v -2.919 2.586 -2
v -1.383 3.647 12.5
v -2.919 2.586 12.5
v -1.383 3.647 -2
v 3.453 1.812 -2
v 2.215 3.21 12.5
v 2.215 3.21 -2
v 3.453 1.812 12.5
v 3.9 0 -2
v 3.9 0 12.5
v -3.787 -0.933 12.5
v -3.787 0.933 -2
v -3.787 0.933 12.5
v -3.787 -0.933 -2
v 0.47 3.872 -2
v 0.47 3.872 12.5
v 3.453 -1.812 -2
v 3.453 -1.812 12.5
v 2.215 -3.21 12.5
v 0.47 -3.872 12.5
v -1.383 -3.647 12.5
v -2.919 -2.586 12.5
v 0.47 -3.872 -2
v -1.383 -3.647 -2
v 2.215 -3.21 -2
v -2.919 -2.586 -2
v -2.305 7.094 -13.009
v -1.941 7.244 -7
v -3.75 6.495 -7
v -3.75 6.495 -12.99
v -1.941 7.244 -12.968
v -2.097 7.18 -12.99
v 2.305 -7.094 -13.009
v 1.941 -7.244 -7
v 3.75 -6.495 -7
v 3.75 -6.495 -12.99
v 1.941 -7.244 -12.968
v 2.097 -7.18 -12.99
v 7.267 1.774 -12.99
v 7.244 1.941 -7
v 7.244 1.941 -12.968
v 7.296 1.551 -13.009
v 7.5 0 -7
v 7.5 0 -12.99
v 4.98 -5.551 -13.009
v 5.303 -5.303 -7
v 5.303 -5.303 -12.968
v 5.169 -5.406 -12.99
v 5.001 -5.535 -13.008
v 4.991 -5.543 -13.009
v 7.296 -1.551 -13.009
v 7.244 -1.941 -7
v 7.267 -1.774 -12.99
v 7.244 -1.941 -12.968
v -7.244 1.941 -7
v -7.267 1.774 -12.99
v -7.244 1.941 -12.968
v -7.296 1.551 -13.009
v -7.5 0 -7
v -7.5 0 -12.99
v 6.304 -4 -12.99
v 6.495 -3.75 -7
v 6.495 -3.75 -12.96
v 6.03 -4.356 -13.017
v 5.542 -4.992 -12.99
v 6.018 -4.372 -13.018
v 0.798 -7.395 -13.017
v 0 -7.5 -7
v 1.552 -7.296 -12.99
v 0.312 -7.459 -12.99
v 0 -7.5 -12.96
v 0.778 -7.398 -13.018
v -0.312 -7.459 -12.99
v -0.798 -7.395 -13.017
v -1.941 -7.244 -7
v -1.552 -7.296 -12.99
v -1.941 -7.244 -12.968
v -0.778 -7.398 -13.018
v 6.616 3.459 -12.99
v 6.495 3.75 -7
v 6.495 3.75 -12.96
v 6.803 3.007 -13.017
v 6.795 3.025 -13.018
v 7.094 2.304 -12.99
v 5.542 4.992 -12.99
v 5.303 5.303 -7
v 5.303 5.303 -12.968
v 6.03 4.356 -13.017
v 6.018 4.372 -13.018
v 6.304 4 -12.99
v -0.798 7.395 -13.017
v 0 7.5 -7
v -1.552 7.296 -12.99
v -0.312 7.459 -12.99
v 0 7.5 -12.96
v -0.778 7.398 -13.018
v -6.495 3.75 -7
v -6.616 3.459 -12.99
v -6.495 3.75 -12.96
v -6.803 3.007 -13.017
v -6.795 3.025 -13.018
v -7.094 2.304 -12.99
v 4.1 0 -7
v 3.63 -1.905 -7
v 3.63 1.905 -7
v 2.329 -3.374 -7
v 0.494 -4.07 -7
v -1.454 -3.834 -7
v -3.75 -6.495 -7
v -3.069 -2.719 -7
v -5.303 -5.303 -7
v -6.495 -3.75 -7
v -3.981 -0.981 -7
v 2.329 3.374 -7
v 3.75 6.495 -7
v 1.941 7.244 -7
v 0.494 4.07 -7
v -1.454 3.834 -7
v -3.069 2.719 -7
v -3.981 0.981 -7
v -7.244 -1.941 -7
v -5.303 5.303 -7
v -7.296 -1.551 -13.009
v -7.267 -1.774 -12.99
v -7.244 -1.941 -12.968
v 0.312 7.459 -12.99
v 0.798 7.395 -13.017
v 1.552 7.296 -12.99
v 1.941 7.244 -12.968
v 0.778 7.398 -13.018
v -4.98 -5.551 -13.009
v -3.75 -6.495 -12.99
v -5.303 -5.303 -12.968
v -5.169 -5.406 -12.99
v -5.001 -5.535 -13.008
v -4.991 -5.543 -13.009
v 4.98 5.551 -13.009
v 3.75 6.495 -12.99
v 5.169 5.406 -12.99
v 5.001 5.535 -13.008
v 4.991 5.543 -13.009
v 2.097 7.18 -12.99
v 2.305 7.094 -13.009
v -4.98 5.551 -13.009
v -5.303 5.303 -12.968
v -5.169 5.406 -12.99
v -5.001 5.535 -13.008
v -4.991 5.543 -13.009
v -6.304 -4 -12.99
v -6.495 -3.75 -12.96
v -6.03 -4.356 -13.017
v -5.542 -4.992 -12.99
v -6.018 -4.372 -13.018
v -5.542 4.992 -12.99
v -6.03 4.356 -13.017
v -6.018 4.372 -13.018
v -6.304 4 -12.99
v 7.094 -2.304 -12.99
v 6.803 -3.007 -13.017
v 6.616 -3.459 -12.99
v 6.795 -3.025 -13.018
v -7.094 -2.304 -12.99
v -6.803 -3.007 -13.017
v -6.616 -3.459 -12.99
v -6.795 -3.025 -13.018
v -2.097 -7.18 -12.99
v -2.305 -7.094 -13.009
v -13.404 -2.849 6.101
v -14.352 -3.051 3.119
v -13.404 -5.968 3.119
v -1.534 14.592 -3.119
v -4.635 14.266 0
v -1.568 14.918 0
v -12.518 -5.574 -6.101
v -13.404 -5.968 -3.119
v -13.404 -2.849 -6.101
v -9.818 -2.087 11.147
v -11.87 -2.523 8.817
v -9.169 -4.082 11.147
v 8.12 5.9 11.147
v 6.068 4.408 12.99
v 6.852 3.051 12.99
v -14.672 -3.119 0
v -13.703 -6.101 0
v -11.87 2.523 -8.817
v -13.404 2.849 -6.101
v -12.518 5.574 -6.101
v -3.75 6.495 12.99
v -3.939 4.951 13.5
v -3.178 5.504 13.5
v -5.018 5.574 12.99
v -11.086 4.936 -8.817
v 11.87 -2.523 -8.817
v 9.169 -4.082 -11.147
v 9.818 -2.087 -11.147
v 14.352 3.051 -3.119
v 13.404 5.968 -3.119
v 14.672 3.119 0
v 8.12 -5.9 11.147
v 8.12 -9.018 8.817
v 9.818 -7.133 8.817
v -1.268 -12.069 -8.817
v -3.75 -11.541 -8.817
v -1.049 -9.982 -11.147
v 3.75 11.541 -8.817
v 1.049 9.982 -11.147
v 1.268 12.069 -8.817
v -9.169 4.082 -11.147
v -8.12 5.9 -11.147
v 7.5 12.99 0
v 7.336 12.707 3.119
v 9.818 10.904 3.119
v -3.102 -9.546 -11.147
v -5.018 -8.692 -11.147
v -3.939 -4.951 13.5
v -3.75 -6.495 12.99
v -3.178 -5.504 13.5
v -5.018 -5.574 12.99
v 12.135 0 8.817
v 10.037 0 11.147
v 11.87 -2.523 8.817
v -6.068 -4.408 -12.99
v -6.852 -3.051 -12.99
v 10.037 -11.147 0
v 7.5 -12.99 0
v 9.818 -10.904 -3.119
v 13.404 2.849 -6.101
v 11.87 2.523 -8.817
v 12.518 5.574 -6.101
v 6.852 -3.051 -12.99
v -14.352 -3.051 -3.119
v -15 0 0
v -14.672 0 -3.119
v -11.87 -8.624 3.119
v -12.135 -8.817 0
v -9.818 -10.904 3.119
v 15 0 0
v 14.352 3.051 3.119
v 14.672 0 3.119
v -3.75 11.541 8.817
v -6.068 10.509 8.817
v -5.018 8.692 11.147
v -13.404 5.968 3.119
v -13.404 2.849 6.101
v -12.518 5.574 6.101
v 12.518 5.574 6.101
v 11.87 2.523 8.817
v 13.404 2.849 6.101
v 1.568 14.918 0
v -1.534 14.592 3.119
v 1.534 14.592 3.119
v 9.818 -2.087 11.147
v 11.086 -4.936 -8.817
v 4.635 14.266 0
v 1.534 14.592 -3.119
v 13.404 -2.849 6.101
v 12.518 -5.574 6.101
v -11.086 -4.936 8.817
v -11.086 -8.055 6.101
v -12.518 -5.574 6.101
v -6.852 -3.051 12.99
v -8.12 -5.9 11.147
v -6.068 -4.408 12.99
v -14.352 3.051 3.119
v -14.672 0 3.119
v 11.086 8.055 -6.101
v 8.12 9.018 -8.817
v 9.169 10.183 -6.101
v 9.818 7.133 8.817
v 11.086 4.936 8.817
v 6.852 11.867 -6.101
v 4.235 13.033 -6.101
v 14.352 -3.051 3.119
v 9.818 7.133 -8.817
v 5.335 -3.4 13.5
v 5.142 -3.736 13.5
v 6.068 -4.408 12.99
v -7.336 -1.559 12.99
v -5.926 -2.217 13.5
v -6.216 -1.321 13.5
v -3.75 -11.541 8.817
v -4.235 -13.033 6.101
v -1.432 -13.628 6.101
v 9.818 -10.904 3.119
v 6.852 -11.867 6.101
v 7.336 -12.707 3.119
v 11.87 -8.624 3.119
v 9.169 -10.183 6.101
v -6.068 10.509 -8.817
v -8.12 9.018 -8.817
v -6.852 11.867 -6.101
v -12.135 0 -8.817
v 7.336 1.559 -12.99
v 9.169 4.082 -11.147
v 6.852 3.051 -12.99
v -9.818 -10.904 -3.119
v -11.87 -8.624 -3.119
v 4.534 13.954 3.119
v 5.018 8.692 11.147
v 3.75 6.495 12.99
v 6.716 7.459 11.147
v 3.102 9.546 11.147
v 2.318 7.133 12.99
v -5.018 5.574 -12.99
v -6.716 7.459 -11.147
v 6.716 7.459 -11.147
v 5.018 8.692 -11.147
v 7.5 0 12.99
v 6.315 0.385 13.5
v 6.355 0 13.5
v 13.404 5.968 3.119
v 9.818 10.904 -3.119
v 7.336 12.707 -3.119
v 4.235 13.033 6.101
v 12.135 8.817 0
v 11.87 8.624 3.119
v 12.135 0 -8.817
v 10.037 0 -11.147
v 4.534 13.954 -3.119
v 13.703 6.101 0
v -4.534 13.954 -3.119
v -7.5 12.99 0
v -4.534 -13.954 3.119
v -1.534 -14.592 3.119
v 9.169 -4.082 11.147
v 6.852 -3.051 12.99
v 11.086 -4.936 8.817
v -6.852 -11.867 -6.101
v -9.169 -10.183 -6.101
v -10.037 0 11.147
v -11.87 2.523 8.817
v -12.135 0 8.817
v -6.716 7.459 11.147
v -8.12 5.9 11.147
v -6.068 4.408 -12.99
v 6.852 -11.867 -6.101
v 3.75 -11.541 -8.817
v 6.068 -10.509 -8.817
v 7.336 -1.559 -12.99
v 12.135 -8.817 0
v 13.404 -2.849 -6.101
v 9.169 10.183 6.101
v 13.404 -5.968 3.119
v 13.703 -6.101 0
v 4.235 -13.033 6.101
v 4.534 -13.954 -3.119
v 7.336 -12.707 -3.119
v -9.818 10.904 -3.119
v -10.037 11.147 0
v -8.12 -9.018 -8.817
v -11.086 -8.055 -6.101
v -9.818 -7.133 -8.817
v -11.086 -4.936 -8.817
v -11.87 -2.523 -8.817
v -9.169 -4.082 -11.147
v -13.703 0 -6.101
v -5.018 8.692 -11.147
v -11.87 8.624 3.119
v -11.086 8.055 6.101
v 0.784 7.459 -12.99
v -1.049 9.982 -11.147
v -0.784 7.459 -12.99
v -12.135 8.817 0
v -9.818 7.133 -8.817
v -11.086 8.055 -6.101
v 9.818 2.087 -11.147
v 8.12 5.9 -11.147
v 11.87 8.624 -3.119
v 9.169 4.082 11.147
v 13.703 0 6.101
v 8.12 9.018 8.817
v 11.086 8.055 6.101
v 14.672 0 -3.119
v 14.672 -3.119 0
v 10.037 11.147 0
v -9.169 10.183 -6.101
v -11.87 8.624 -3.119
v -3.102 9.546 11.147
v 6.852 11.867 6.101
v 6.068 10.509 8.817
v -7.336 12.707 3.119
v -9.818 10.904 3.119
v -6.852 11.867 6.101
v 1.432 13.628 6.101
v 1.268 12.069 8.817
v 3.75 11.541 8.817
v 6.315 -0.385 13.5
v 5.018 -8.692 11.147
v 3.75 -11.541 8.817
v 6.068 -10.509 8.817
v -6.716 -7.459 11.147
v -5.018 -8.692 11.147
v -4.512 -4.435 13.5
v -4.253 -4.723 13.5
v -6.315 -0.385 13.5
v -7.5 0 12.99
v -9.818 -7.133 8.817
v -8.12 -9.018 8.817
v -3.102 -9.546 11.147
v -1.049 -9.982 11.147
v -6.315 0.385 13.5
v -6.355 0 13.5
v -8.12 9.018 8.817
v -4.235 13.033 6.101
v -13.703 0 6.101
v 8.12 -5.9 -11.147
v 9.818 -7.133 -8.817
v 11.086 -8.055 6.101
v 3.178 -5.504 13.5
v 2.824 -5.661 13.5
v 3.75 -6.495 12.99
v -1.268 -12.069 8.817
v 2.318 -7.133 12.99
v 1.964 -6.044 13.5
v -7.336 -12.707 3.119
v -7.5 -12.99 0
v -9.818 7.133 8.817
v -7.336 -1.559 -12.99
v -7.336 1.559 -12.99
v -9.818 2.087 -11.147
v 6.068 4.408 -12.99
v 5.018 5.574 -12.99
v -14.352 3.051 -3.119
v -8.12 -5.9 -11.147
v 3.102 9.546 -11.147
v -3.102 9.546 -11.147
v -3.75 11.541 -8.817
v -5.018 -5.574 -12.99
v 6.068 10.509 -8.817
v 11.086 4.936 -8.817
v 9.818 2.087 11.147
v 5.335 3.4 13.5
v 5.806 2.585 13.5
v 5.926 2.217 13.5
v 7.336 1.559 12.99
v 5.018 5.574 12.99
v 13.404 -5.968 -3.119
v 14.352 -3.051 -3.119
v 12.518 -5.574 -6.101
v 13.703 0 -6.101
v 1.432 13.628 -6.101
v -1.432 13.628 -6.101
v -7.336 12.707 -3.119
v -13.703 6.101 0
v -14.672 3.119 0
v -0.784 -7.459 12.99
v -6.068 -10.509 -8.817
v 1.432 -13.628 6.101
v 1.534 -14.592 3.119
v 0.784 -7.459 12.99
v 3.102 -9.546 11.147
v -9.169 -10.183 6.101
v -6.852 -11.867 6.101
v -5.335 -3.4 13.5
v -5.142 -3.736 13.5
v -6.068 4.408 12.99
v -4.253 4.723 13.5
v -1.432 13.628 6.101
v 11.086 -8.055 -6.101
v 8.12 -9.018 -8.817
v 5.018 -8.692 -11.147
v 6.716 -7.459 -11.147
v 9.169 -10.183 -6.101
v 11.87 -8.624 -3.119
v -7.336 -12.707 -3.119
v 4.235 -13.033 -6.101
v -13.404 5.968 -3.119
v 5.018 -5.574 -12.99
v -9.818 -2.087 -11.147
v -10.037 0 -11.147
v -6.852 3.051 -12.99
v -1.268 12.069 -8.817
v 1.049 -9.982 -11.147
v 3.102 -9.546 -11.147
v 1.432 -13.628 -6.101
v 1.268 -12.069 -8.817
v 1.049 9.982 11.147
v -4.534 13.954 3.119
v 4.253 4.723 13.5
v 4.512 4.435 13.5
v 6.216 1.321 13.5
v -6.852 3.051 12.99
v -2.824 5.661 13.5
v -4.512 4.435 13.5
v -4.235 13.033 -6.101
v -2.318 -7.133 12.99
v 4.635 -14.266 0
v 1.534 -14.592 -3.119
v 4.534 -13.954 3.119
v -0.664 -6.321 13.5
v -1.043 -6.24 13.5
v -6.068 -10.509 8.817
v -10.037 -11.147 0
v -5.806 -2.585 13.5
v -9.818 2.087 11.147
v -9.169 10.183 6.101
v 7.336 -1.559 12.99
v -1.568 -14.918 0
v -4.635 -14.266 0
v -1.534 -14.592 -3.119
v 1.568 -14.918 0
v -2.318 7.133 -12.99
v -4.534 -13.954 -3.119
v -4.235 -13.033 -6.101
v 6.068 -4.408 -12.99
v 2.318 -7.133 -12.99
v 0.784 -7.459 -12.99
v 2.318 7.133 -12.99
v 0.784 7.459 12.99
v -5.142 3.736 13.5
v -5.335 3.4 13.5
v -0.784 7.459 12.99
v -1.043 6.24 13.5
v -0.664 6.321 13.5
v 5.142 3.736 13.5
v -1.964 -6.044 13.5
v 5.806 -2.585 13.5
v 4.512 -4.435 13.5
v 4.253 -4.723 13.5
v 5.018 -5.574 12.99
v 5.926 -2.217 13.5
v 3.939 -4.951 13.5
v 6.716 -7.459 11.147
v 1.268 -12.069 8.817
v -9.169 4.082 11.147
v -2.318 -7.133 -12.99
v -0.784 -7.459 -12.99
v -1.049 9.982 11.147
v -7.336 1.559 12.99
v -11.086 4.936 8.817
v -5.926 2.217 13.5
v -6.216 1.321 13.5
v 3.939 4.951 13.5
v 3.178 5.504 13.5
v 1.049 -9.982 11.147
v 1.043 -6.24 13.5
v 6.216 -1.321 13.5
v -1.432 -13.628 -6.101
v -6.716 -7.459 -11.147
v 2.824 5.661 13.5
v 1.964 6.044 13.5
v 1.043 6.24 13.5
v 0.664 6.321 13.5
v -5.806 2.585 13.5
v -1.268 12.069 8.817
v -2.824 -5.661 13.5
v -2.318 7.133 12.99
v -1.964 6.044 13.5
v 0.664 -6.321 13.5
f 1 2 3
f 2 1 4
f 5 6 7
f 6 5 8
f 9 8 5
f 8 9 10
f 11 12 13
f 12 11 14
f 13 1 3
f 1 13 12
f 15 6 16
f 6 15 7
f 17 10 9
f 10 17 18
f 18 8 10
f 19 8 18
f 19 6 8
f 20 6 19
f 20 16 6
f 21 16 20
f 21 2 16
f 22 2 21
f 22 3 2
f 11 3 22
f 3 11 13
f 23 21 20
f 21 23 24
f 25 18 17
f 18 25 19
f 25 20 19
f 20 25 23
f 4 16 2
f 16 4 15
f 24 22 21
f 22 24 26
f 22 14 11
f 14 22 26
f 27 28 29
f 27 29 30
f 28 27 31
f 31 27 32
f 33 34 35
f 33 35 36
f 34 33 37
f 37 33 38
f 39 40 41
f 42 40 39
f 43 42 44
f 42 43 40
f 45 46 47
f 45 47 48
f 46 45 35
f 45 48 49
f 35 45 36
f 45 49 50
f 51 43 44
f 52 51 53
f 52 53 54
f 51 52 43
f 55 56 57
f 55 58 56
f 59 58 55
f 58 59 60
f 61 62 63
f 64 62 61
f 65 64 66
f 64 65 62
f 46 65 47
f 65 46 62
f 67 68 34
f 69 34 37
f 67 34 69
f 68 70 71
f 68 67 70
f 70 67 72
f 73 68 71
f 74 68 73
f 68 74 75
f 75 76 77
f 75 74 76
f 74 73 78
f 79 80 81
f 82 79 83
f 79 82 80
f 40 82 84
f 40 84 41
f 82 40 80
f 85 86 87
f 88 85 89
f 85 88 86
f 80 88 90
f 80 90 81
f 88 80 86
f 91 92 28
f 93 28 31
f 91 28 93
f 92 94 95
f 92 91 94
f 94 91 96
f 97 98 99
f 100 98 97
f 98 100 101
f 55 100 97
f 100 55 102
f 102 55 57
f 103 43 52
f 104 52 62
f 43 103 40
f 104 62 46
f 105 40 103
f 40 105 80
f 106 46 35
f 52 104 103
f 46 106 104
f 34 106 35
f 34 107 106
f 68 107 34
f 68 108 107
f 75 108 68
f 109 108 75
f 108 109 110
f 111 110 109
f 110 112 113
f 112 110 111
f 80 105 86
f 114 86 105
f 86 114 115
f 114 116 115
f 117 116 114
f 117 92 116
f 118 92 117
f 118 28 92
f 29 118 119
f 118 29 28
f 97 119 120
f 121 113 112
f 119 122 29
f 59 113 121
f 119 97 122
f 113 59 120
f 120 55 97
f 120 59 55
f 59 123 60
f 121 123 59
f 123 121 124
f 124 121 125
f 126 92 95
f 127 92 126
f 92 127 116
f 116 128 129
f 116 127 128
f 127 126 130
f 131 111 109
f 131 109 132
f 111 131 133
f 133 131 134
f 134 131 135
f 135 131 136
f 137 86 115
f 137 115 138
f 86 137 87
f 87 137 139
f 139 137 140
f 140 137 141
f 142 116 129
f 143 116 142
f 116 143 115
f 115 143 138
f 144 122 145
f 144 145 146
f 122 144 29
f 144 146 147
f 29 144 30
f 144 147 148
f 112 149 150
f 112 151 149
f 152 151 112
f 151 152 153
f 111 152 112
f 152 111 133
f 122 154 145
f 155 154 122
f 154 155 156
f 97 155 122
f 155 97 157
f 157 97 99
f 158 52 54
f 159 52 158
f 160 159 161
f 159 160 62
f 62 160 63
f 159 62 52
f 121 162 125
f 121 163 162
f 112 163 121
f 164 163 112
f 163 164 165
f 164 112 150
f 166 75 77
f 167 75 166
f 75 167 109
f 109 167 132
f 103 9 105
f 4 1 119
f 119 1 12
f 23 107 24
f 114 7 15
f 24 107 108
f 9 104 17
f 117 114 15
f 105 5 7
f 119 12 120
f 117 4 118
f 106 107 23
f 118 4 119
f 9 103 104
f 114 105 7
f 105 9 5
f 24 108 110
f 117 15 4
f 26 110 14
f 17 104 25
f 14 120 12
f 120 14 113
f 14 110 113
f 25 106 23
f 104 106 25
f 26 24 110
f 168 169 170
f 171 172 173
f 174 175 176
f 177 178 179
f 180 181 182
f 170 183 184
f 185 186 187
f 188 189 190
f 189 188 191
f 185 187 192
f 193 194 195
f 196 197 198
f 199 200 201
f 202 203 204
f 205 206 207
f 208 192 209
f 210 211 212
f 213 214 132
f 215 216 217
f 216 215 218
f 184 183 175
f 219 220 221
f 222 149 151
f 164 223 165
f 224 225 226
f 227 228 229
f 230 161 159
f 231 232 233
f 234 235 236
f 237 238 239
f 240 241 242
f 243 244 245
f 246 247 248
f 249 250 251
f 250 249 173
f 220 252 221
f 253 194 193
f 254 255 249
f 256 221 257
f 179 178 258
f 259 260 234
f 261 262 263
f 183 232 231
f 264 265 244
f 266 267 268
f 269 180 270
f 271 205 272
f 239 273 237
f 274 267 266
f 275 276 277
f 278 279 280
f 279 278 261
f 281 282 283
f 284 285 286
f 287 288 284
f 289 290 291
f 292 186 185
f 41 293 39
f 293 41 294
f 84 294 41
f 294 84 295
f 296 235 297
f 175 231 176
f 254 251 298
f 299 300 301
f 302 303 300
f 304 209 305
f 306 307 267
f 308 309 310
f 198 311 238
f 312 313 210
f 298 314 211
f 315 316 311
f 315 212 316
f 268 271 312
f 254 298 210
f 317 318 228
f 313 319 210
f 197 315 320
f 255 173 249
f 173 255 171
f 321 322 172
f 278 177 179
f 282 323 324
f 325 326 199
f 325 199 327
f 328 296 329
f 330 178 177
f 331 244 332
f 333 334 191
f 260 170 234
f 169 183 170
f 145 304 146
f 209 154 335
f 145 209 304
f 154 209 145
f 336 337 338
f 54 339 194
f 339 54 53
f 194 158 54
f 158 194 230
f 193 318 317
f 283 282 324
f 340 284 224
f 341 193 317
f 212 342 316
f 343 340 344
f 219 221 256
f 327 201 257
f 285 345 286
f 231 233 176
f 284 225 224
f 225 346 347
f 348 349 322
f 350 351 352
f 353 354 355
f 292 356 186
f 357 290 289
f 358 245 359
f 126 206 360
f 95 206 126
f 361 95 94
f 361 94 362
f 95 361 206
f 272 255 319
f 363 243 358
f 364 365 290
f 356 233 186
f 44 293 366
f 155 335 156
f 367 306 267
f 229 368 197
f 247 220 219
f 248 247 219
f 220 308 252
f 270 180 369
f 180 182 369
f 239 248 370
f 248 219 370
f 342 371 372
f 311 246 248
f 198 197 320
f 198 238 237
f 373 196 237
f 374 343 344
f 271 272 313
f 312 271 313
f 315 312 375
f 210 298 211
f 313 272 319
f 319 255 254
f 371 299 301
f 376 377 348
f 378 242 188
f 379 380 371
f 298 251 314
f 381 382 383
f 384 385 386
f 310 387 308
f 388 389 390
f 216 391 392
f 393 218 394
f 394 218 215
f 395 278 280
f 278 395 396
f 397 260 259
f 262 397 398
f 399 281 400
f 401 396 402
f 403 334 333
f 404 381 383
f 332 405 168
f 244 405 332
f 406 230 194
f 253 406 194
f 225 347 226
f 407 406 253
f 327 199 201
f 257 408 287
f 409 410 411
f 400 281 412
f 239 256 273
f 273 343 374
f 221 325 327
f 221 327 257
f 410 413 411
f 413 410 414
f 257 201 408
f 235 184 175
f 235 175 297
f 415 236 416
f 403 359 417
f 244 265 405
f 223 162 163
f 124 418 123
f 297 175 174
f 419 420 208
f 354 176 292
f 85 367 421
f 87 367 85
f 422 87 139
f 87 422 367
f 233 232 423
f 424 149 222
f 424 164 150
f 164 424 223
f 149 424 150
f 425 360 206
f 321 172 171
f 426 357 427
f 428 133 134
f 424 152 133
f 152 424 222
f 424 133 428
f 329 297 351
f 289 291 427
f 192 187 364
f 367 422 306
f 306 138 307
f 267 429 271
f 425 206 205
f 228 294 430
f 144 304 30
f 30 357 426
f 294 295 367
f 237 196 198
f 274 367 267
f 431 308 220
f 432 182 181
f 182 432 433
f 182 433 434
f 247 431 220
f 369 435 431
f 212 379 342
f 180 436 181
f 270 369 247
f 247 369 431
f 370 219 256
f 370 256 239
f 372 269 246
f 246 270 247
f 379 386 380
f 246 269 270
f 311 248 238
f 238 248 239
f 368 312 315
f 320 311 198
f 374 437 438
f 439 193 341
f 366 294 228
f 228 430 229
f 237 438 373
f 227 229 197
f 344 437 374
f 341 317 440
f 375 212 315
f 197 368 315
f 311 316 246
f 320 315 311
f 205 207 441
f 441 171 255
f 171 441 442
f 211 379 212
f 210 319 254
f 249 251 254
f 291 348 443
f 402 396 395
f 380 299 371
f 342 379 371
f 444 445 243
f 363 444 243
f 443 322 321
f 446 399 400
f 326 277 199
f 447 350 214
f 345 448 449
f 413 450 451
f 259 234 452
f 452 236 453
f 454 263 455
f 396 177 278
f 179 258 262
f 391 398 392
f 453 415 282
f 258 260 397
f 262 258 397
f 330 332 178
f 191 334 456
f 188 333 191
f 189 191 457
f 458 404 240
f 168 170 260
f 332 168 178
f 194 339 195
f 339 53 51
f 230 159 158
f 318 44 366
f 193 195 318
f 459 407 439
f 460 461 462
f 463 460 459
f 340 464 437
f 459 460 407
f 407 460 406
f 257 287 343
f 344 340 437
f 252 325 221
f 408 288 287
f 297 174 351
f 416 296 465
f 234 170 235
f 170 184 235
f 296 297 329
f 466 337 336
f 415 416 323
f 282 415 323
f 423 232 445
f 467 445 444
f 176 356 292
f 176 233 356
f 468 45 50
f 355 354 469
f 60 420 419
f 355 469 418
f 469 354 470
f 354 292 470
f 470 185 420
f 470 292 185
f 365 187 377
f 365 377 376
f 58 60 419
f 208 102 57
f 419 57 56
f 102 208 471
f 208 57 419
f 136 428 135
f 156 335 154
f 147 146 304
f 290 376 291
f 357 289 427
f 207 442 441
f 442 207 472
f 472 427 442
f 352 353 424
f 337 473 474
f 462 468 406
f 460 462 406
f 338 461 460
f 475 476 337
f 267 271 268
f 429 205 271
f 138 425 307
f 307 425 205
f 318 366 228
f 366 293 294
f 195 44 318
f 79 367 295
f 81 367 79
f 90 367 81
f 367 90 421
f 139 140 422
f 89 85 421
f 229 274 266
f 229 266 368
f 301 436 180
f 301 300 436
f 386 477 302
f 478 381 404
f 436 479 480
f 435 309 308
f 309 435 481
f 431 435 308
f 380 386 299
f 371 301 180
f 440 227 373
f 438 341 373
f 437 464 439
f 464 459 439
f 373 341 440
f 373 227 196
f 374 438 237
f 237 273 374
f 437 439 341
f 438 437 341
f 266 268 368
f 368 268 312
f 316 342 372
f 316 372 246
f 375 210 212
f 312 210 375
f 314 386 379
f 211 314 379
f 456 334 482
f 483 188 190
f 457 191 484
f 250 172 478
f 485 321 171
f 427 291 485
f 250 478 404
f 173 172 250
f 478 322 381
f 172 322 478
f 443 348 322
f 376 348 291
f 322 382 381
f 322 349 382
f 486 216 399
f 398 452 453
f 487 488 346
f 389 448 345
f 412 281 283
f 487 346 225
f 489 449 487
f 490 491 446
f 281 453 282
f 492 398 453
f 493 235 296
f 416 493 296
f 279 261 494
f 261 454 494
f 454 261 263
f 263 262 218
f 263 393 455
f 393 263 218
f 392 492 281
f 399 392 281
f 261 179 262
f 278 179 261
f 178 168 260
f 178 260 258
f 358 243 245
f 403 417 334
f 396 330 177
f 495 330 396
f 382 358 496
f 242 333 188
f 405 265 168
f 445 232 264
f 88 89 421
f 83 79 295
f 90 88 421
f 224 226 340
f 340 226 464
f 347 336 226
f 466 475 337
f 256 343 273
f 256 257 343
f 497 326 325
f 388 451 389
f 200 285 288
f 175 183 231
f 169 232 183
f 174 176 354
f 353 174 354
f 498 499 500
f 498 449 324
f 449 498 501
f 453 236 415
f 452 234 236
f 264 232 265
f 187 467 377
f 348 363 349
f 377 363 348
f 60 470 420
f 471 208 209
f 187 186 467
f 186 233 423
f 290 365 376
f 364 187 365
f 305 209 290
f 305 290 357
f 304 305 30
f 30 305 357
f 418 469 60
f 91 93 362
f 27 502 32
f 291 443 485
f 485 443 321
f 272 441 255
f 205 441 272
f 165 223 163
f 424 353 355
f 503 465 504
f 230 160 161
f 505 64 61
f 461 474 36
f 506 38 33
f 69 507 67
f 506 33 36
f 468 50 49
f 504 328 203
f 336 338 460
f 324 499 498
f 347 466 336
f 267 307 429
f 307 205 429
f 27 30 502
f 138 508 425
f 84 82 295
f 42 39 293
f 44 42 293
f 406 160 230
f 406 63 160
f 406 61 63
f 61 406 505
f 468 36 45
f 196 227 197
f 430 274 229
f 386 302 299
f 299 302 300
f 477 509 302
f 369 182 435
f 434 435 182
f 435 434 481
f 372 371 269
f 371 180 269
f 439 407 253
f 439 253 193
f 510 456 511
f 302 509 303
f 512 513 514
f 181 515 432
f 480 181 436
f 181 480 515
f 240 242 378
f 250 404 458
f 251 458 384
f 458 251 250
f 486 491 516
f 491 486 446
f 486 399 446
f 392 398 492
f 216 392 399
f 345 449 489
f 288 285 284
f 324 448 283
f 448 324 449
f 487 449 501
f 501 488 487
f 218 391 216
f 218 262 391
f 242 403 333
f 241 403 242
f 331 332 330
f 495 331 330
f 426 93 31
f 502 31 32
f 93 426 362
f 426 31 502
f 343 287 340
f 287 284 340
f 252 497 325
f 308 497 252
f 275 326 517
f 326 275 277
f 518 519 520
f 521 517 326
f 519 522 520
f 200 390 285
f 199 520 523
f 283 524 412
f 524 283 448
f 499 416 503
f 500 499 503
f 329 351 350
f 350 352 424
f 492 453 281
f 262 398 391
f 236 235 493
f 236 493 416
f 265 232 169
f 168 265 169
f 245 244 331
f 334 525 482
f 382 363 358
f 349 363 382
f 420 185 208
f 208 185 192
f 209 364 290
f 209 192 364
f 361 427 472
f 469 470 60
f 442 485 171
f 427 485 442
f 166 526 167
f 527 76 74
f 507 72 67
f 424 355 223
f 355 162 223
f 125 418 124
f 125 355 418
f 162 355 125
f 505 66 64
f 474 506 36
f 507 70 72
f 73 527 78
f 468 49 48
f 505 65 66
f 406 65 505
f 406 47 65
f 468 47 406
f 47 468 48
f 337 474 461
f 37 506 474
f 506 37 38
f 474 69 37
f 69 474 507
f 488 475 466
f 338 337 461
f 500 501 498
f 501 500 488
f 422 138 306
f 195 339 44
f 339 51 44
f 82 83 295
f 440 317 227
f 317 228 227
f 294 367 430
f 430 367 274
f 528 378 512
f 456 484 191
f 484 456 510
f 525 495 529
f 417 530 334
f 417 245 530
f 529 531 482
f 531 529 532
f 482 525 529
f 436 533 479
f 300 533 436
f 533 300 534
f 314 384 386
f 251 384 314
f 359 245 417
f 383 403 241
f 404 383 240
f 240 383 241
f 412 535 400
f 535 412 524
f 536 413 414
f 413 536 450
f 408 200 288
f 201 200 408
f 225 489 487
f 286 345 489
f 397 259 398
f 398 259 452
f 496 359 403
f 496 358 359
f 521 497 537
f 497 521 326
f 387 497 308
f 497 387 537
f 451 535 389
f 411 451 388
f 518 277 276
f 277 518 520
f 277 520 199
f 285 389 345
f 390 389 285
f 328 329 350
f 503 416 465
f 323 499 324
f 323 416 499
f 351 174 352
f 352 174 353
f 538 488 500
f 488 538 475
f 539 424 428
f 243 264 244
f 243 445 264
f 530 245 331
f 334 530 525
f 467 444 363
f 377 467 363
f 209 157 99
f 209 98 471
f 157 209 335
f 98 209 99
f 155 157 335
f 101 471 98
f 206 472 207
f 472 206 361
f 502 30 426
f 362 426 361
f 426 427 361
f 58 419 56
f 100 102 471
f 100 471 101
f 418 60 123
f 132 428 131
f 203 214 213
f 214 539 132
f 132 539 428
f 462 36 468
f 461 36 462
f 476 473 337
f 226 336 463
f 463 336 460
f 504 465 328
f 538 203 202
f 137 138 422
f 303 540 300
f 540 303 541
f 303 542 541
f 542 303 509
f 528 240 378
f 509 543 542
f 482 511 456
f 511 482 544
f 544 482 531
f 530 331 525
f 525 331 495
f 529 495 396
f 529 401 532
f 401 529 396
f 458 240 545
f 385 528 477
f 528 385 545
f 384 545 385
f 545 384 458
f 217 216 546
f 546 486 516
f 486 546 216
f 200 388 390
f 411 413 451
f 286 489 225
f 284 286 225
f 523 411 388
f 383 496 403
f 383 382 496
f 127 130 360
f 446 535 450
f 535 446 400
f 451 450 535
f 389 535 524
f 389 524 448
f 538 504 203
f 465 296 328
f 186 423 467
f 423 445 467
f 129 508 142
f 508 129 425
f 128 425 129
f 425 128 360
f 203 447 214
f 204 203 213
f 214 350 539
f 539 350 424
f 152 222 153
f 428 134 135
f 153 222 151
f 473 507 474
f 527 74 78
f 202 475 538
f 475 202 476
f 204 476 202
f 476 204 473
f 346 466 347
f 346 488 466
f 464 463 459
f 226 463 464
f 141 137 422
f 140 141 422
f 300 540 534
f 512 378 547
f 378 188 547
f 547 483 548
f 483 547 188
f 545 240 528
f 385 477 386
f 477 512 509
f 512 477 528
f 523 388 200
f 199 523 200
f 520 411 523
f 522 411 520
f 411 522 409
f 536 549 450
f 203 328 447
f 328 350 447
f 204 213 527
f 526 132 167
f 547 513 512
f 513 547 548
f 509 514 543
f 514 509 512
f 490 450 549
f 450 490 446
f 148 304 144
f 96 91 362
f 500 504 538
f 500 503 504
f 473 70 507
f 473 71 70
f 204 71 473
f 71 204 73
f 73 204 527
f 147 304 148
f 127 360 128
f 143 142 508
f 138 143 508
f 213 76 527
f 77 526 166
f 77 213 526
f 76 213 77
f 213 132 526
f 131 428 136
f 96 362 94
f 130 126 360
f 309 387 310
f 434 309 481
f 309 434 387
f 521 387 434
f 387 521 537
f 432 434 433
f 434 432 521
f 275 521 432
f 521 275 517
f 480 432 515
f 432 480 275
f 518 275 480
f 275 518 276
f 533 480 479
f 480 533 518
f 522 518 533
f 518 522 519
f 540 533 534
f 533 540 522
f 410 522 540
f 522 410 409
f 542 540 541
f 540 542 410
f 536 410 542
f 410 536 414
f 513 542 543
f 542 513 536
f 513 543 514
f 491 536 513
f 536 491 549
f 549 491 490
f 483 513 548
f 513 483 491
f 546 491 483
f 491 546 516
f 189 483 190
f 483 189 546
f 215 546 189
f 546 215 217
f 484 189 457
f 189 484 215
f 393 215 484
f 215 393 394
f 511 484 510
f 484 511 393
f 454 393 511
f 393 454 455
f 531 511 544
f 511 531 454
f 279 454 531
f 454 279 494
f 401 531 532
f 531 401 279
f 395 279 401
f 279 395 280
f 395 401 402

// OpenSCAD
sphere_d = 30;
cut_off=1.5;
hole_d = 7.8;
hole_depth = sphere_d-cut_off-1;
hole_taper_d = 8.2;
hole_taper_h = 5;
nut_hole_h = 8;
nut_hole_d = 15;

 
difference() {
sphere(d=sphere_d);
translate([0, 0, -0.5*sphere_d]) {
  cylinder(h=hole_depth, d=hole_d);
  cylinder(h=nut_hole_h, d=nut_hole_d);
  translate([0, 0, nut_hole_h]) cylinder(h=hole_taper_h, d1=hole_taper_d, d2=hole_d);
}
translate([0, 0, 0.5*sphere_d-cut_off]) cylinder(d=sphere_d, h=sphere_d);
}
